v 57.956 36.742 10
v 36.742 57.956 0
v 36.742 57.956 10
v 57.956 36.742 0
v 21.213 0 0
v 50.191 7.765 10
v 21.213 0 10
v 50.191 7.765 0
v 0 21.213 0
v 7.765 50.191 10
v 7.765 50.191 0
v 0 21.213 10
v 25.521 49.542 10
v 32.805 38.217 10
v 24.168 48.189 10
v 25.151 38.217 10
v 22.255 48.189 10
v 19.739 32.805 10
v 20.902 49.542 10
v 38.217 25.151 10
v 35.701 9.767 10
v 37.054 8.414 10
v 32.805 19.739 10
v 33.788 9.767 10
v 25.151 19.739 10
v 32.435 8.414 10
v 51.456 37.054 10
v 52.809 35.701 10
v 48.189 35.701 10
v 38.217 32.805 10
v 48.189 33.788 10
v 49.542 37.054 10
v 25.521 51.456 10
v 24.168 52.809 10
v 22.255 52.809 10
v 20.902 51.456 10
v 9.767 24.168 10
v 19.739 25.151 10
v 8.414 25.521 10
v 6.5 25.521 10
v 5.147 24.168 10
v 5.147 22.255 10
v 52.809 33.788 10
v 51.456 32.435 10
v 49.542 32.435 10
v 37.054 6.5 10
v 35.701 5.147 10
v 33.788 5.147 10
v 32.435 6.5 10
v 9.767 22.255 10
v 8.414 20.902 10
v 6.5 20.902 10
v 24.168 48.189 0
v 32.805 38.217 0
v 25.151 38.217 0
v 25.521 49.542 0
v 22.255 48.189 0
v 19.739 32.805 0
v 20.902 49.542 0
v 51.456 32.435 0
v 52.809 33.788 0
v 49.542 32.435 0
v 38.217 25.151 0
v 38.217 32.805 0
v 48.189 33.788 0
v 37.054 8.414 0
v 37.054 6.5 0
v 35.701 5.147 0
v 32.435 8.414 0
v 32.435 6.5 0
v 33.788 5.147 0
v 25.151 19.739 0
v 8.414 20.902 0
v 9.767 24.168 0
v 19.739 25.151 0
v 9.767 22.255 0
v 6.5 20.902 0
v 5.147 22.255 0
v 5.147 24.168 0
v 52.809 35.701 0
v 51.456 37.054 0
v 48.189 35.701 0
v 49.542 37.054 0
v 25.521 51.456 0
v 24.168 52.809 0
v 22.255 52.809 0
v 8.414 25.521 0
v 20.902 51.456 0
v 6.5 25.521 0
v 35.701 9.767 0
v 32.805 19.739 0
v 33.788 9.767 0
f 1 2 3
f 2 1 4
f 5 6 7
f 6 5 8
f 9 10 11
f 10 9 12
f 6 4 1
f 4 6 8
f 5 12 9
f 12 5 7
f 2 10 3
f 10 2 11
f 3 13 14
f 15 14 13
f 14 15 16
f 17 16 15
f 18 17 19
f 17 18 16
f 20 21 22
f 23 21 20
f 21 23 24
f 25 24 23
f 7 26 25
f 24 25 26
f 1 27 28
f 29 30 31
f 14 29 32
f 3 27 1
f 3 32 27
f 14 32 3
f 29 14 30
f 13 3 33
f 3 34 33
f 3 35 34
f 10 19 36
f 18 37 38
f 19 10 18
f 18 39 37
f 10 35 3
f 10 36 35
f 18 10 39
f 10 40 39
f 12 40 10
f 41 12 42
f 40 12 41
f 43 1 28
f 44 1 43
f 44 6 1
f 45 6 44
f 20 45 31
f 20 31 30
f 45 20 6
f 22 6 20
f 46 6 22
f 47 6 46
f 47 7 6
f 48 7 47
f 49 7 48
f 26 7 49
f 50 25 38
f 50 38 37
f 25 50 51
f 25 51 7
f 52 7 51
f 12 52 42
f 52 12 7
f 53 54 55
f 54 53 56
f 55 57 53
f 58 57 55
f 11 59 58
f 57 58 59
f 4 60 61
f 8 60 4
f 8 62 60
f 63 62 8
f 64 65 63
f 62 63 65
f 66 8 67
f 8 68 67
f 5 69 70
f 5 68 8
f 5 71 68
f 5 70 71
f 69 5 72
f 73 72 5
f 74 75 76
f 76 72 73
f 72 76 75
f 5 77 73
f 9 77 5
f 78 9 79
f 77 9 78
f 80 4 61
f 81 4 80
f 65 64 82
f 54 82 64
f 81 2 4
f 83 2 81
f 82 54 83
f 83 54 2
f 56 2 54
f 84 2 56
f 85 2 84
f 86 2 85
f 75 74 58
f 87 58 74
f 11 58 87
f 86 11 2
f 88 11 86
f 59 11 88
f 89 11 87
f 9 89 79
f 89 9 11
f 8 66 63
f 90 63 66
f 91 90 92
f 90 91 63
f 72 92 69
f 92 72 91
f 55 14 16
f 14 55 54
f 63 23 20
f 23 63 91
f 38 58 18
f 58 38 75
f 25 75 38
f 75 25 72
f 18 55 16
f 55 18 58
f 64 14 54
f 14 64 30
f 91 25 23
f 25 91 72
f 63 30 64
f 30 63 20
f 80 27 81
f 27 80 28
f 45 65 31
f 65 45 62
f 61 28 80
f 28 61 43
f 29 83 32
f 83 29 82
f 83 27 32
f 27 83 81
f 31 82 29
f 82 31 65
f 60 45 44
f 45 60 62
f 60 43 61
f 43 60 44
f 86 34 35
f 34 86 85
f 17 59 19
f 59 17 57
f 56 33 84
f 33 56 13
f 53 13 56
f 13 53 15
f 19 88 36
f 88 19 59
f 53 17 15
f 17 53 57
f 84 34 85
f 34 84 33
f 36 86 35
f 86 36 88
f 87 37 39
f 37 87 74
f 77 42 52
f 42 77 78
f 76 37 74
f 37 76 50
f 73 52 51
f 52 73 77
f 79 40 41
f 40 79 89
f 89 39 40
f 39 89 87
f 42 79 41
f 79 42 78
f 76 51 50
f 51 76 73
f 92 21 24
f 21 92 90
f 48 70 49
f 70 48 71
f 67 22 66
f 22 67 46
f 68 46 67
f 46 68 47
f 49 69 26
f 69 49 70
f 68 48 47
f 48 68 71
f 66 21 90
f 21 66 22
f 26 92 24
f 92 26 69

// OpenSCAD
$fn = 32;

// ----------------------------------------------------------------------
// Polygon plate: 6-gon R30, 4 bolt windows
// ----------------------------------------------------------------------

// --- parameters (mm) ---
sides = 6;                // number of polygon sides
plate_r = 30;             // circumscribed radius of the polygon
bore_r = 10;              // centre bore radius
bolts = 4;                // number of bolt windows
ring_r = 22.28;           // bolt-circle radius
bolt_r = 2.5;             // bolt window radius
plate_t = 10;             // plate thickness, Z (extrusion height)

plate_d = 2 * plate_r;  // circumscribed diameter
bore_d = 2 * bore_r;  // centre bore diameter
bolt_d = 2 * bolt_r;  // bolt window diameter
ring_d = 2 * ring_r;  // bolt-circle diameter

profile = [[57.956, 36.742], [36.742, 57.956], [7.765, 50.191], [0, 21.213], [21.213, 0], [50.191, 7.765]];  // primary outline, 6 points, counter clockwise
void_1 = [[38.217, 32.805], [32.805, 38.217], [25.151, 38.217], [19.739, 32.805], [19.739, 25.151], [25.151, 19.739], [32.805, 19.739], [38.217, 25.151]];  // centre bore, 8 points
void_2 = [[52.809, 35.701], [51.456, 37.054], [49.542, 37.054], [48.189, 35.701], [48.189, 33.788], [49.542, 32.435], [51.456, 32.435], [52.809, 33.788]];  // bolt window 1, 8 points
void_3 = [[25.521, 51.456], [24.168, 52.809], [22.255, 52.809], [20.902, 51.456], [20.902, 49.542], [22.255, 48.189], [24.168, 48.189], [25.521, 49.542]];  // bolt window 2, 8 points
void_4 = [[9.767, 24.168], [8.414, 25.521], [6.5, 25.521], [5.147, 24.168], [5.147, 22.255], [6.5, 20.902], [8.414, 20.902], [9.767, 22.255]];  // bolt window 3, 8 points
void_5 = [[37.054, 8.414], [35.701, 9.767], [33.788, 9.767], [32.435, 8.414], [32.435, 6.5], [33.788, 5.147], [35.701, 5.147], [37.054, 6.5]];  // bolt window 4, 8 points

// --- the one profile operation ---
difference() {
  linear_extrude(height = plate_t) polygon(points = profile);
  translate([0, 0, -1])
    linear_extrude(height = plate_t + 2) polygon(points = void_1);
  translate([0, 0, -1])
    linear_extrude(height = plate_t + 2) polygon(points = void_2);
  translate([0, 0, -1])
    linear_extrude(height = plate_t + 2) polygon(points = void_3);
  translate([0, 0, -1])
    linear_extrude(height = plate_t + 2) polygon(points = void_4);
  translate([0, 0, -1])
    linear_extrude(height = plate_t + 2) polygon(points = void_5);
}
